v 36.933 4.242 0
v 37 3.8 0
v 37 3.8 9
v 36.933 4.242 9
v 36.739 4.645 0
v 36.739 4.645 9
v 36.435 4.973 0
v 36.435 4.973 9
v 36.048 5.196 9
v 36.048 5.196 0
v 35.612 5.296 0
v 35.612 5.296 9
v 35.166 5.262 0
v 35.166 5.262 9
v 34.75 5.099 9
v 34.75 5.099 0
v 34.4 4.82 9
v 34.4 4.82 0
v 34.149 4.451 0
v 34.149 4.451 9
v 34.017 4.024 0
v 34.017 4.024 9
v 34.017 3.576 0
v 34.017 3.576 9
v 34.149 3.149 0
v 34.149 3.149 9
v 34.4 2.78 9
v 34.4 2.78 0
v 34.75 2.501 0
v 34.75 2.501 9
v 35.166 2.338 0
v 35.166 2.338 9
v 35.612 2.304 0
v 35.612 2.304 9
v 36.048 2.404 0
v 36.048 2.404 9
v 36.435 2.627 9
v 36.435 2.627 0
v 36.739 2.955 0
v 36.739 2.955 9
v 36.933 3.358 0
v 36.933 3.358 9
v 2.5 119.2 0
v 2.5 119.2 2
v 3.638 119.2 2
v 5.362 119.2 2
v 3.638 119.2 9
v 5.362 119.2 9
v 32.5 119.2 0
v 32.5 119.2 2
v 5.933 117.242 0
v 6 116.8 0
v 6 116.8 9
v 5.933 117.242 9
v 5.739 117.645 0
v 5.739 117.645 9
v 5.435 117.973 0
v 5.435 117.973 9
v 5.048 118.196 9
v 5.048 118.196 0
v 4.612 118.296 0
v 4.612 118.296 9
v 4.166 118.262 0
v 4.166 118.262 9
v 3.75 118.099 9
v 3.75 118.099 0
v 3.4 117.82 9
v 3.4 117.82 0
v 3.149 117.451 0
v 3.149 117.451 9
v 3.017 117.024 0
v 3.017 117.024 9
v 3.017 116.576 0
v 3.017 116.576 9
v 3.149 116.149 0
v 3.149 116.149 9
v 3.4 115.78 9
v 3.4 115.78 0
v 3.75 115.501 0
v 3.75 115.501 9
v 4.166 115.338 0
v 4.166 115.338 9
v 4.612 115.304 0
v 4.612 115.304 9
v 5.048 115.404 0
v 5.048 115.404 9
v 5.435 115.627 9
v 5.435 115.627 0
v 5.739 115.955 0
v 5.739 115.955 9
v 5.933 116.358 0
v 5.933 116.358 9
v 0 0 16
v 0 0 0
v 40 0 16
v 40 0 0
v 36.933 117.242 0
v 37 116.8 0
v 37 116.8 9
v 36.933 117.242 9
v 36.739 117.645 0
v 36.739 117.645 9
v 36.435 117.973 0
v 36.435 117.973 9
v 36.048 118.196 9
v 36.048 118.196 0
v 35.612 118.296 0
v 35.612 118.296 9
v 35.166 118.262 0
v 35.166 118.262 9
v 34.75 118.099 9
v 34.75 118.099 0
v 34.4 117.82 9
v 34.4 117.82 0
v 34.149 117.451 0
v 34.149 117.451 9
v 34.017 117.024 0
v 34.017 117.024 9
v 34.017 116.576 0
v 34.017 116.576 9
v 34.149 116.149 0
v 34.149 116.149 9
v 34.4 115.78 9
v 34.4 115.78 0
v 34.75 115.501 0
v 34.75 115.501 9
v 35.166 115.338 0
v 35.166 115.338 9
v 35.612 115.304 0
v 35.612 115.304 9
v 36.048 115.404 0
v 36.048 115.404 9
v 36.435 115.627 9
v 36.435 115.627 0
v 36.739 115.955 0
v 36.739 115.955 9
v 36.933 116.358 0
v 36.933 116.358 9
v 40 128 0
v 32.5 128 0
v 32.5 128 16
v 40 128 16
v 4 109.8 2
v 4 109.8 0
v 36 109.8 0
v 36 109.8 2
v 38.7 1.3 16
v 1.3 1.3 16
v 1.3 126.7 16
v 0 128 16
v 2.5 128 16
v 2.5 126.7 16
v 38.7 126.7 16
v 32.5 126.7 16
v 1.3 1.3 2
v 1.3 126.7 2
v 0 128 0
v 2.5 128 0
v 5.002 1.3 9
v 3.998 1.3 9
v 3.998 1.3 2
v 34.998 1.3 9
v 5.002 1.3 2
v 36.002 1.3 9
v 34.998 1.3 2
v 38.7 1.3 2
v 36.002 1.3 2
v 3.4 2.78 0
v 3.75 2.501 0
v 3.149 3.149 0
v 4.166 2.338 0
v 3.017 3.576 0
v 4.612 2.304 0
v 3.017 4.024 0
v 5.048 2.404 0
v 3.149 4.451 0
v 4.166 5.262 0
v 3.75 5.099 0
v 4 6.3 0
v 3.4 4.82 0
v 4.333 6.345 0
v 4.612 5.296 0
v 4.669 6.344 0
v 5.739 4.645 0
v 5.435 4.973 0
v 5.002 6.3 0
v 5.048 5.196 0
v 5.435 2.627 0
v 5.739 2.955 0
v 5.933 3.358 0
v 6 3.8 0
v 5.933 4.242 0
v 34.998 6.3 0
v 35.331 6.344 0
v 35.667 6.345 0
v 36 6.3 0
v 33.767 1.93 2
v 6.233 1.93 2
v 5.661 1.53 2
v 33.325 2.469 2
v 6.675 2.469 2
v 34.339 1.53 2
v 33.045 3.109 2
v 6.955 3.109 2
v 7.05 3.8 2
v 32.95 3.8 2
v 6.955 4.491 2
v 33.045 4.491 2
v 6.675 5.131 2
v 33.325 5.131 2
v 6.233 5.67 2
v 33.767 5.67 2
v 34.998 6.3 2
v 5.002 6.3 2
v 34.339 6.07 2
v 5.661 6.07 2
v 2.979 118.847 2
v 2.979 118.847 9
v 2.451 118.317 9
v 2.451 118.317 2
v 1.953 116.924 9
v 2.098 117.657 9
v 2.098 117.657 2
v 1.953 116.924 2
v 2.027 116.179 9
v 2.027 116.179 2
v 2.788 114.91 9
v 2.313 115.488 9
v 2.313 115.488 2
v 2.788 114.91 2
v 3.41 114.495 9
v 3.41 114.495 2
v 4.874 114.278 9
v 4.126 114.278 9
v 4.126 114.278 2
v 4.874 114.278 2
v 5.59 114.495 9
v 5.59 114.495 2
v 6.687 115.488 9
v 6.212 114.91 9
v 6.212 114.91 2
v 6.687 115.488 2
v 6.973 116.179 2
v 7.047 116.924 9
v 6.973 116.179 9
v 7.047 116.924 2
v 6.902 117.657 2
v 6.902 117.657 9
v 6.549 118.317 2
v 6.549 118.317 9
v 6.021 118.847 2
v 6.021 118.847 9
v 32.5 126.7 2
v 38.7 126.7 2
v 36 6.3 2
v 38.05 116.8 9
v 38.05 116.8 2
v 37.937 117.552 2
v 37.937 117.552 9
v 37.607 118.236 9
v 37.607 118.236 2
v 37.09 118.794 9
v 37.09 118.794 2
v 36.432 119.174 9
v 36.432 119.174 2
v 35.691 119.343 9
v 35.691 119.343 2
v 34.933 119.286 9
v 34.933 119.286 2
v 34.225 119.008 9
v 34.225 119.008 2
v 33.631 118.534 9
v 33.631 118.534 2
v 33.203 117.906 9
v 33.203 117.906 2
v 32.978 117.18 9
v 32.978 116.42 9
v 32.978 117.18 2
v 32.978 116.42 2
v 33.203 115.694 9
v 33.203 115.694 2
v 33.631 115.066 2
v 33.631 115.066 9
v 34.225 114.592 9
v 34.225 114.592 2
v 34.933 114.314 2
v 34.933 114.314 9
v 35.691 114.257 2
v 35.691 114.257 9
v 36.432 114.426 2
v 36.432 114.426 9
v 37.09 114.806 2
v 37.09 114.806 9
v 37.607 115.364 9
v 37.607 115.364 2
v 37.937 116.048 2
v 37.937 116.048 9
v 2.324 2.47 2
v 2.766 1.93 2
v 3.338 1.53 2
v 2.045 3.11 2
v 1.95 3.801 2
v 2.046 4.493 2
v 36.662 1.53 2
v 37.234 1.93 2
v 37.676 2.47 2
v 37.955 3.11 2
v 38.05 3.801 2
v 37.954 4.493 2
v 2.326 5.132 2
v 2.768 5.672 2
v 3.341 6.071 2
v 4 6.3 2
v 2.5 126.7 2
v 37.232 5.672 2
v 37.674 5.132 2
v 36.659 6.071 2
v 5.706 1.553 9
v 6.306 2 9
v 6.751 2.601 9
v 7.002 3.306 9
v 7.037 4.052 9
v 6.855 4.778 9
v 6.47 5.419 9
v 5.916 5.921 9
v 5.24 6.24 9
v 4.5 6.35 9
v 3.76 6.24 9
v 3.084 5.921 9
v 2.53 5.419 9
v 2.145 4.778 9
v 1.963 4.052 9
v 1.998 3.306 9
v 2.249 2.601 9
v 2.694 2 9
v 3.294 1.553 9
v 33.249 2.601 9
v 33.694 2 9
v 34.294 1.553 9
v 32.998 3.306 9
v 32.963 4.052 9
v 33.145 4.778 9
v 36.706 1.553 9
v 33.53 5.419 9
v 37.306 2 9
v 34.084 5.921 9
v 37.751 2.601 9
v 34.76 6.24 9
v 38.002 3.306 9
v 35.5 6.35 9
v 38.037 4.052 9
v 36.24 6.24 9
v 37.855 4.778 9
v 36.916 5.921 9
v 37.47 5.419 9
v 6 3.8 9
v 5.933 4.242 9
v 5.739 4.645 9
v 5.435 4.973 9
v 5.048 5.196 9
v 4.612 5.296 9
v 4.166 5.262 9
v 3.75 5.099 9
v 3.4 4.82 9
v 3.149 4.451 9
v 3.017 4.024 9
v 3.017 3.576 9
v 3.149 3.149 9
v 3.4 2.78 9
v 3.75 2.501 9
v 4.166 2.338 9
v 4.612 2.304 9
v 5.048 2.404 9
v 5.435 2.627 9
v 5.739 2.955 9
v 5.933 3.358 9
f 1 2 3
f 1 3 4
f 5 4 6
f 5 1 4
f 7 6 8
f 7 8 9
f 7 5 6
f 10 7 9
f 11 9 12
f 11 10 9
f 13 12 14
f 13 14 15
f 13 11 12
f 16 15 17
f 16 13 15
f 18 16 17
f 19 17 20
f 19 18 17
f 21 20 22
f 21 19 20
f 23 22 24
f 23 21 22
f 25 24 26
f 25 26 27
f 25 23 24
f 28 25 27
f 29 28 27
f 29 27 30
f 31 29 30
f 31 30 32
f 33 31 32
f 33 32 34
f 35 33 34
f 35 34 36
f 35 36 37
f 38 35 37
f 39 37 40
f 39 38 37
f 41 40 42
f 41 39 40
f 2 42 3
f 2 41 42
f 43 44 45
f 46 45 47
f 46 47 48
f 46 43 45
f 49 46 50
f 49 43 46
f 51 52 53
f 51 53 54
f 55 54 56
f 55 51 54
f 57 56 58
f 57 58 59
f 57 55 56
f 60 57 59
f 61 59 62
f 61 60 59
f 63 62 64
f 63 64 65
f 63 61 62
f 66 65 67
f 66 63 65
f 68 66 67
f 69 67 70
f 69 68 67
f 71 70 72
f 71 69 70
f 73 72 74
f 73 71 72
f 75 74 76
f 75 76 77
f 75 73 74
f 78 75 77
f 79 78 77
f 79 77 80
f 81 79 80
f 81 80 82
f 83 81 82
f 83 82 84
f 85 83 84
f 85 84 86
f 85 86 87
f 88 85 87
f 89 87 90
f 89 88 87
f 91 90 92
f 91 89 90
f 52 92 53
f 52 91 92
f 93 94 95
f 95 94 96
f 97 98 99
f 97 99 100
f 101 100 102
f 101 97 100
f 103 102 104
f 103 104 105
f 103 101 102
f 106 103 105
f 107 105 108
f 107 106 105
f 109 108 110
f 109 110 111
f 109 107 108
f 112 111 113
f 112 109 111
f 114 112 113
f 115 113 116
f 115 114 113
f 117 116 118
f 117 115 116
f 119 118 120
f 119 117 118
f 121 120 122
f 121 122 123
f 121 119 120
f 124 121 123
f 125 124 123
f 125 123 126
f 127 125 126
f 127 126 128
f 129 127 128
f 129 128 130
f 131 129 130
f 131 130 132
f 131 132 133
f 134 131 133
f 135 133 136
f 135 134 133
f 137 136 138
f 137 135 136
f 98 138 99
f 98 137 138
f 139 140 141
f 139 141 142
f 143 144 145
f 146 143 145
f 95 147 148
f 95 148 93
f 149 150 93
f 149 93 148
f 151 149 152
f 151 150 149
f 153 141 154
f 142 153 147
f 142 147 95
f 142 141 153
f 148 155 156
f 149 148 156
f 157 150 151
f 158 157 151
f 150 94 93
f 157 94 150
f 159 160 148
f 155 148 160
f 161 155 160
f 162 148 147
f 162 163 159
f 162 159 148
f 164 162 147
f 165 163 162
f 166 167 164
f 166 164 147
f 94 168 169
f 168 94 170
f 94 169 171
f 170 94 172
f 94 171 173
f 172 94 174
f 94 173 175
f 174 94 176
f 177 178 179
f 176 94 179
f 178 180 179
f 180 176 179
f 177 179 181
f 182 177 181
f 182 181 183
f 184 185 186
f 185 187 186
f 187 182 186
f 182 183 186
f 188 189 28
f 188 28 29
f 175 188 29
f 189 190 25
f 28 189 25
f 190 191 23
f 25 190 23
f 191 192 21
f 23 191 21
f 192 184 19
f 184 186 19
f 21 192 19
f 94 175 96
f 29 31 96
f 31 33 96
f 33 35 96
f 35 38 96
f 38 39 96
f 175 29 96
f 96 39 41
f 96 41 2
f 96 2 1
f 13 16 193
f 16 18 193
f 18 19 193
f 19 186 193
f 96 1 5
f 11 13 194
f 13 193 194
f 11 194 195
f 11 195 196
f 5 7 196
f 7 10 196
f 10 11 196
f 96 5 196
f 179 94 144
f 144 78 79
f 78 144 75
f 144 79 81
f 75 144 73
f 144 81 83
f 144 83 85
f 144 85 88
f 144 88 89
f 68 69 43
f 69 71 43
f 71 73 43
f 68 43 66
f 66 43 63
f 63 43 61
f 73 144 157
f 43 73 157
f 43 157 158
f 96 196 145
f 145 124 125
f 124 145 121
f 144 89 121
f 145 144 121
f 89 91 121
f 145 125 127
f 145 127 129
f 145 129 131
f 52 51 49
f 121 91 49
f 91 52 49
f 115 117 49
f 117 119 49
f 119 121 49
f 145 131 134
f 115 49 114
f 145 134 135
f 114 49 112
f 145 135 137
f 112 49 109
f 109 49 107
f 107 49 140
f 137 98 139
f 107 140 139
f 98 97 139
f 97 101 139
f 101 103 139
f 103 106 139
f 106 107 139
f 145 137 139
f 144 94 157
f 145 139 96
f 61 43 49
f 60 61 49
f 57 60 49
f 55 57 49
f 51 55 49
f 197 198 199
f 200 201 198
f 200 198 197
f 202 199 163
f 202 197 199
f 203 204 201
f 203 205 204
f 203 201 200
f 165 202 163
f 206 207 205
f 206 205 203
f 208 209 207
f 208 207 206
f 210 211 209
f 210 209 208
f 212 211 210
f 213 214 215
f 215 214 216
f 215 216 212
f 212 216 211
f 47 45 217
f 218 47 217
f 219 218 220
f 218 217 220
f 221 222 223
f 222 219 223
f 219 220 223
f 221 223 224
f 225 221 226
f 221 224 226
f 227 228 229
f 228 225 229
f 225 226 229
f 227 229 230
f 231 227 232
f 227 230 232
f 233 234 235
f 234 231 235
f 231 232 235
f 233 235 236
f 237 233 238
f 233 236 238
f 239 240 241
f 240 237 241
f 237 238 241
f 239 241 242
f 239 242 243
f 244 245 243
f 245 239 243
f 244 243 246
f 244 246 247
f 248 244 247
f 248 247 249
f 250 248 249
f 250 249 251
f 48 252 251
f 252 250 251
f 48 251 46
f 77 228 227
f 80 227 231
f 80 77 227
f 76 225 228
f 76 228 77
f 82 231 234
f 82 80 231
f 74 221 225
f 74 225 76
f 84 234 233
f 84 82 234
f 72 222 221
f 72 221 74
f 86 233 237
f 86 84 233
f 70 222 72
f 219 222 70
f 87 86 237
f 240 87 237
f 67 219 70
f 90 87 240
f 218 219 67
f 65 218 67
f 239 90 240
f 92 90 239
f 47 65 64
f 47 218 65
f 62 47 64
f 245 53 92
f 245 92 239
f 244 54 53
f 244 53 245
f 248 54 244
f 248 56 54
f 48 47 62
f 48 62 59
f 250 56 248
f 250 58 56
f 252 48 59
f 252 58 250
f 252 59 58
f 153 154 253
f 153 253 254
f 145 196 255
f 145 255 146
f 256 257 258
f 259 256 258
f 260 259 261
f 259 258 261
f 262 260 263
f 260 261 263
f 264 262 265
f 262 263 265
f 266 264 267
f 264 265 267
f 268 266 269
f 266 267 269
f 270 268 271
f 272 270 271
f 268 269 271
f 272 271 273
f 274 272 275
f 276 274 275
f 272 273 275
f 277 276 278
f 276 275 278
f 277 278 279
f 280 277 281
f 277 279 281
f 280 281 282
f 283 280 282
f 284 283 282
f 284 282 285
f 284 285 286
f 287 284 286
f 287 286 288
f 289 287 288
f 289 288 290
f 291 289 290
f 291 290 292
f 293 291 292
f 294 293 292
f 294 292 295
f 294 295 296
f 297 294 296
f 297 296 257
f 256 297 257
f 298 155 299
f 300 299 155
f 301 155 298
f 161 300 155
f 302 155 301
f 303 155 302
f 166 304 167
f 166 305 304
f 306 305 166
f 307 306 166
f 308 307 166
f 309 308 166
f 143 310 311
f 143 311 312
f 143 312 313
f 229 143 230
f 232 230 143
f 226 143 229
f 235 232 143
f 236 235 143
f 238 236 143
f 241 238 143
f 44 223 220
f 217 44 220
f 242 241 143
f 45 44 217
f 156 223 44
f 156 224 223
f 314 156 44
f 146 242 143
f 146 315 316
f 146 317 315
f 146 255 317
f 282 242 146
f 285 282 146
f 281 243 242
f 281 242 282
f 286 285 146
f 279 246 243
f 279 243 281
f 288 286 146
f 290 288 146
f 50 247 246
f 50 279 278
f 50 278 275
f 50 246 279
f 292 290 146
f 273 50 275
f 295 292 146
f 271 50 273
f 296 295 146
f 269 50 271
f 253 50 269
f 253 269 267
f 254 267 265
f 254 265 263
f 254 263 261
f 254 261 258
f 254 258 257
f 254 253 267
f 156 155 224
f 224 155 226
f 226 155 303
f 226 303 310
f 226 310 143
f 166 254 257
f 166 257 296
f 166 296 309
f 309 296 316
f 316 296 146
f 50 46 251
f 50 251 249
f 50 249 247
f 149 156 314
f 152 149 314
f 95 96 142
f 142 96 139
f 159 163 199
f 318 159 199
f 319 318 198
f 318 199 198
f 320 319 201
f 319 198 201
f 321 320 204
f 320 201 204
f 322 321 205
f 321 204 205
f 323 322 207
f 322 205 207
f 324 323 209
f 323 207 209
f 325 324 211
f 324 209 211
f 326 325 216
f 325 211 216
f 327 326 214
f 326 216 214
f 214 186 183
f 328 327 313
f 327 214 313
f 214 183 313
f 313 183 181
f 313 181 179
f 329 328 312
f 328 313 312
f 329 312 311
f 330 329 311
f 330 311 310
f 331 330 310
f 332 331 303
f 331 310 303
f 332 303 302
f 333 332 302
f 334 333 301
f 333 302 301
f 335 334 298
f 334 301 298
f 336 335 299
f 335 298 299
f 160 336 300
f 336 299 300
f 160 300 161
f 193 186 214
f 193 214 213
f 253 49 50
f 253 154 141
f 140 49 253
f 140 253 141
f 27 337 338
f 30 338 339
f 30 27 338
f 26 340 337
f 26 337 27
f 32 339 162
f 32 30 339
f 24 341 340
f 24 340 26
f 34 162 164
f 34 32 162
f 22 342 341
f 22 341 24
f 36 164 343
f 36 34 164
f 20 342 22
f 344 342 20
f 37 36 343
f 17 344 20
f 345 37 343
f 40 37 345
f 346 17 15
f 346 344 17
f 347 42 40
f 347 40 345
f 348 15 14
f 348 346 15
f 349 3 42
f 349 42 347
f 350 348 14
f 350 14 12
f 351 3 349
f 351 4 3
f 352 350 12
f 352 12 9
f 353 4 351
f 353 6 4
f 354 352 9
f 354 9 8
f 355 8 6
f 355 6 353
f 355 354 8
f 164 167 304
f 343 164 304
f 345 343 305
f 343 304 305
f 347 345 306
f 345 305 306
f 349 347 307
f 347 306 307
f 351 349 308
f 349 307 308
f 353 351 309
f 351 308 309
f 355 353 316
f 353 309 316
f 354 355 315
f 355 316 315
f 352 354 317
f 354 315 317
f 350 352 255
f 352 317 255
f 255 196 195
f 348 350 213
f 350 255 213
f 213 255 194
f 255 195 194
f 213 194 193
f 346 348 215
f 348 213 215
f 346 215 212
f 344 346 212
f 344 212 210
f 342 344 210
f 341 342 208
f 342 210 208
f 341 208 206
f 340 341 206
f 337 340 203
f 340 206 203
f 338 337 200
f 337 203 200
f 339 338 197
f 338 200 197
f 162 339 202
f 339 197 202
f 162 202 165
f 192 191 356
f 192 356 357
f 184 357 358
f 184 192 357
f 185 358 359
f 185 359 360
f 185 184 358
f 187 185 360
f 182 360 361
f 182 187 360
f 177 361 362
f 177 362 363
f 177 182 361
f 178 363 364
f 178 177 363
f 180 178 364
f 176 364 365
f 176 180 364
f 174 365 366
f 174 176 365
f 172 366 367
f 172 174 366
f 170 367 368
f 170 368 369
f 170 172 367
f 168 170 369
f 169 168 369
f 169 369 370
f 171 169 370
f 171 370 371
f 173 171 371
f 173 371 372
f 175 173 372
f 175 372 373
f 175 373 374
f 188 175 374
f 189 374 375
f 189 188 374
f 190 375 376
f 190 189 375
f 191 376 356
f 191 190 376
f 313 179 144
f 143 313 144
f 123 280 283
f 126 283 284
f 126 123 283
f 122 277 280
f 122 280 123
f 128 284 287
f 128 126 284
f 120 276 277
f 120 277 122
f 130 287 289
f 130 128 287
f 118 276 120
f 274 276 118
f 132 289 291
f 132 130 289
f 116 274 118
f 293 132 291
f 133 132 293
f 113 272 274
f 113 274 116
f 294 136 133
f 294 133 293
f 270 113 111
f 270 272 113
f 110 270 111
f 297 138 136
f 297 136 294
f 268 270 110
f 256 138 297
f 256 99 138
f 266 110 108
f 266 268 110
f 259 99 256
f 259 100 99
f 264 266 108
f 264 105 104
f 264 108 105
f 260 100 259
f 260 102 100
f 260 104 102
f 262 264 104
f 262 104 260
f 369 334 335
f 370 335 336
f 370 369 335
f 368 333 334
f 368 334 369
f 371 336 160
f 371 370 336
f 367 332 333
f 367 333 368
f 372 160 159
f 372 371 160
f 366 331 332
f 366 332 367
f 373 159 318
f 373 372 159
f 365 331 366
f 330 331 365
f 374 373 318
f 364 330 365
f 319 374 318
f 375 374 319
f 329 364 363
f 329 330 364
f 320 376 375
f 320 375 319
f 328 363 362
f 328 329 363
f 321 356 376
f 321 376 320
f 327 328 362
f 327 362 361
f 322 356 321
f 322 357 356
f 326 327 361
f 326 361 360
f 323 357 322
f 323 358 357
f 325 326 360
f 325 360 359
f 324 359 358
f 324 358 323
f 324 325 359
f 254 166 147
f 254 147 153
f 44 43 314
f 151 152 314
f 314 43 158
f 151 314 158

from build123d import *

# Parameters (mm, degrees)
BOX003_W          = 30
BOX003_H          = 8.8
BOX003_DEPTH      = 16
CYLINDER001_R     = 1.5
CYLINDER001_DEPTH = 9
CYLINDER_R        = 2.55
CYLINDER_DEPTH    = 9
BOX002_W          = 32
BOX002_H          = 103.5
BOX002_DEPTH      = 2
BOX001_W          = 37.4
BOX001_H          = 125.4
BOX001_DEPTH      = 14
BOX_W             = 40
BOX_H             = 128
BOX_DEPTH         = 16


with BuildPart() as connector_cutout:
    # Box003 → Box003 (new body)
    with BuildSketch(Plane(origin=(2.5, 119.2, 0), x_dir=(1, 0, 0), z_dir=(0, 0, 1))):
        with Locations((15, 4.4)):
            Rectangle(BOX003_W, BOX003_H)
    extrude(amount=BOX003_DEPTH)


with BuildPart() as cylinder001:
    # Cylinder001 → Cylinder001 (new body)
    with BuildSketch(Plane(origin=(4.5, 3.8, 0), x_dir=(1, 0, 0), z_dir=(0, 0, 1))):
        Circle(CYLINDER001_R)
    extrude(amount=CYLINDER001_DEPTH)


with BuildPart() as clone003:
    # Clone003 base: copy of Cylinder001
    add(cylinder001.part)


with BuildPart() as clone003_1:
    # Clone003 placement: moved
    add(clone003.part.moved(Location((31, 0, 0))))


with BuildPart() as clone004:
    # Clone004 base: copy of Cylinder001
    add(cylinder001.part)


with BuildPart() as clone004_1:
    # Clone004 placement: moved
    add(clone004.part.moved(Location((0, 113, 0))))


with BuildPart() as board_drills:
    # Clone005 base: copy of Cylinder001
    add(cylinder001.part)


with BuildPart() as board_drills_1:
    # Clone005 placement: moved
    add(board_drills.part.moved(Location((31, 113, 0))))

    # Fusion001: union Clone003, Clone004, Cylinder001
    add(clone003_1.part)
    add(clone004_1.part)
    add(cylinder001.part)


with BuildPart() as cylinder:
    # Cylinder → Cylinder (new body)
    with BuildSketch(Plane(origin=(4.5, 3.8, 0), x_dir=(1, 0, 0), z_dir=(0, 0, 1))):
        Circle(CYLINDER_R)
    extrude(amount=CYLINDER_DEPTH)


with BuildPart() as clone:
    # Clone base: copy of Cylinder
    add(cylinder.part)


with BuildPart() as clone_1:
    # Clone placement: moved
    add(clone.part.moved(Location((31, 0, 0))))


with BuildPart() as clone002:
    # Clone002 base: copy of Cylinder
    add(cylinder.part)


with BuildPart() as clone002_1:
    # Clone002 placement: moved
    add(clone002.part.moved(Location((31, 113, 0))))


with BuildPart() as clone001:
    # Clone001 base: copy of Cylinder
    add(cylinder.part)


with BuildPart() as clone001_1:
    # Clone001 placement: moved
    add(clone001.part.moved(Location((0, 113, 0))))


with BuildPart() as screen_cutout:
    # Box002 → Box002 (new body)
    with BuildSketch(Plane(origin=(4, 6.3, 0), x_dir=(1, 0, 0), z_dir=(0, 0, 1))):
        with Locations((16, 51.75)):
            Rectangle(BOX002_W, BOX002_H)
    extrude(amount=BOX002_DEPTH)


with BuildPart() as cube001:
    # Box001 → Box001 (new body)
    with BuildSketch(Plane(origin=(1.3, 1.3, 2), x_dir=(1, 0, 0), z_dir=(0, 0, 1))):
        with Locations((18.7, 62.7)):
            Rectangle(BOX001_W, BOX001_H)
    extrude(amount=BOX001_DEPTH)


with BuildPart() as case_with_connector_cutout:
    # Box → Box (new body)
    with BuildSketch(Plane.XY):
        with Locations((20, 64)):
            Rectangle(BOX_W, BOX_H)
    extrude(amount=BOX_DEPTH)

    # Cut: cut Cube001
    add(cube001.part, mode=Mode.SUBTRACT)

    # Cut001: cut Screen cutout
    add(screen_cutout.part, mode=Mode.SUBTRACT)

    # Fusion: union Clone, Clone002, Clone001, Cylinder
    add(clone_1.part)
    add(clone002_1.part)
    add(clone001_1.part)
    add(cylinder.part)

    # Cut002: cut Board drills
    add(board_drills_1.part, mode=Mode.SUBTRACT)

    # Cut003: cut Connector cutout
    add(connector_cutout.part, mode=Mode.SUBTRACT)


solid = case_with_connector_cutout.part
